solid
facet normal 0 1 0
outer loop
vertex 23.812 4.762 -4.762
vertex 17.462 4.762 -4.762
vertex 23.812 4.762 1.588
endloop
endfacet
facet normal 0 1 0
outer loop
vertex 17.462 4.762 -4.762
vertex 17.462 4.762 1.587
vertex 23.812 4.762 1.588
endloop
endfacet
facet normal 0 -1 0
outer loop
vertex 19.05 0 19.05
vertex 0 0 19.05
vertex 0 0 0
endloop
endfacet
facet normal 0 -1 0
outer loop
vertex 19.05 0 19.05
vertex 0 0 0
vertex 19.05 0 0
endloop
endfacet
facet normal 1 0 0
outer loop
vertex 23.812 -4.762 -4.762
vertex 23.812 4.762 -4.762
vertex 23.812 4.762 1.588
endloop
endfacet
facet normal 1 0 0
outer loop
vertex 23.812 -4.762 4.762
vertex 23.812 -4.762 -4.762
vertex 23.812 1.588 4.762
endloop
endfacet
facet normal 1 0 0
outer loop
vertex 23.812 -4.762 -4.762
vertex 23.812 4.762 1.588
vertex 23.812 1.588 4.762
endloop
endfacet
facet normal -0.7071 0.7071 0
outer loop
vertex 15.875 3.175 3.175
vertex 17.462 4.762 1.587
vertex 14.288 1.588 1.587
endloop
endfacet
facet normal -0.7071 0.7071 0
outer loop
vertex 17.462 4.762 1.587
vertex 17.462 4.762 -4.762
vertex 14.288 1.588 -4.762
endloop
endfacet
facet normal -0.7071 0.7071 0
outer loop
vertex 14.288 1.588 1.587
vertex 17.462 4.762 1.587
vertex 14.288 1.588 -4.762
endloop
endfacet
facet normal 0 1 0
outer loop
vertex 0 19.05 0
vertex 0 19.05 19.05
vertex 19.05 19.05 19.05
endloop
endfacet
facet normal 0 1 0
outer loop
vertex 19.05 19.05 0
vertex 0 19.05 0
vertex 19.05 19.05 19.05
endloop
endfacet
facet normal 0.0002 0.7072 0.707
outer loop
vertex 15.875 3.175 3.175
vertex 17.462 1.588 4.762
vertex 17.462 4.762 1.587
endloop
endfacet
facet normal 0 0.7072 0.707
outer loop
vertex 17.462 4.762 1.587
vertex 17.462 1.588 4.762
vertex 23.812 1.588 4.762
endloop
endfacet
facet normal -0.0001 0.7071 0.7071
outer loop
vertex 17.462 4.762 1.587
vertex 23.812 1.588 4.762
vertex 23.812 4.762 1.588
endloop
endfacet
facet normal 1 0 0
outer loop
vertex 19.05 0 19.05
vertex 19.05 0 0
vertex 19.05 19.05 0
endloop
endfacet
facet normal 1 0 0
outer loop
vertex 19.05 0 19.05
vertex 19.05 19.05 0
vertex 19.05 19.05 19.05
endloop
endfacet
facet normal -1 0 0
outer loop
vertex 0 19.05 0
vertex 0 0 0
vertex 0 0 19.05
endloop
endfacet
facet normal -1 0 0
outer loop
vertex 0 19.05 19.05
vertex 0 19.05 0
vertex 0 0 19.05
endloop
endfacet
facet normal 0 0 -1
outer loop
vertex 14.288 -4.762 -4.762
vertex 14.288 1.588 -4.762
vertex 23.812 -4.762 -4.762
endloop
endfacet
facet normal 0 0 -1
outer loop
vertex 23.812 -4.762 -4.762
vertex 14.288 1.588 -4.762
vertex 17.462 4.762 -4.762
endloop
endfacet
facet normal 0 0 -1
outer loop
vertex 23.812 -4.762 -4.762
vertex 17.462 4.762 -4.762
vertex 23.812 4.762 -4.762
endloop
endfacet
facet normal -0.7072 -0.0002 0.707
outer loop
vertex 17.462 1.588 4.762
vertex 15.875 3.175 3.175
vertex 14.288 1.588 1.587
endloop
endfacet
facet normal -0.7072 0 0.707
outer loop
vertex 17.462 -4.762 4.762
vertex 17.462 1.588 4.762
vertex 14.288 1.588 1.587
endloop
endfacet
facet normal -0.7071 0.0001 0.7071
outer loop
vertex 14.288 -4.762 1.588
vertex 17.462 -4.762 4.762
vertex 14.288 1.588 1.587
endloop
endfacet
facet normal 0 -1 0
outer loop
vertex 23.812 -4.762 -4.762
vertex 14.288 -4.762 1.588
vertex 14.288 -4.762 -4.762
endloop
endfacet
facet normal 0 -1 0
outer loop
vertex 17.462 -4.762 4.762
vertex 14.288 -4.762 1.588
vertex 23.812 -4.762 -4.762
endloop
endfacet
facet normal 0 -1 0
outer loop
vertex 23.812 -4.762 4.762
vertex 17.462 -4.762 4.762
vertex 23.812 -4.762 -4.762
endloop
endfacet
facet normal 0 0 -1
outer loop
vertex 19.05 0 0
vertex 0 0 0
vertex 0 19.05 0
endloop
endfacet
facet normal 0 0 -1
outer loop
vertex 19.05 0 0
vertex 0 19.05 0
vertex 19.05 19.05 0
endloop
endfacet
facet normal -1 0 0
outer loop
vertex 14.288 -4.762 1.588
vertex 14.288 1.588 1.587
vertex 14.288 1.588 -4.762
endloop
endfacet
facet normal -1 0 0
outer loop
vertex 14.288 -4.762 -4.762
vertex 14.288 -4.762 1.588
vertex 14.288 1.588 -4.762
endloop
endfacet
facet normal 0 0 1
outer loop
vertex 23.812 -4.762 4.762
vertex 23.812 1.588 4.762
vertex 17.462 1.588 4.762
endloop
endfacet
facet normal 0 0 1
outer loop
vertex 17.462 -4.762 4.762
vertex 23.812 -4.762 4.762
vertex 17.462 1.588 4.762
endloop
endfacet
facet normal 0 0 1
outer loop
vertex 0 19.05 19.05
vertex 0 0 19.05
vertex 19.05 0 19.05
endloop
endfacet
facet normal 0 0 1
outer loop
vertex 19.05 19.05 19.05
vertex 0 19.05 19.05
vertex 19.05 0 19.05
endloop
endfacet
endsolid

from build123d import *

# Parameters (mm, degrees)
F0_W     = 19.05
F0_H     = 19.05
F1_DEPTH = 19.05
F4_DEPTH = 9.525
F6_DEPTH = 13.8938
F8_DEPTH = 12.192


# Not quite as in the source:
# - a feature names something its author has since deleted; it is built from what else it names


with BuildPart() as f1:
    # F0 (on Front) → F1 (new body)
    with BuildSketch(Plane.XZ):
        with Locations((9.525, 9.525)):
            Rectangle(F0_W, F0_H)
    extrude(amount=-F1_DEPTH)


with BuildPart() as f4:
    # F3 (on offset) → F4 (new body)
    with BuildSketch(Plane.XZ.offset(-4.7625)):
        Polygon((23.8125, 4.7625), (17.4625, 4.7625), (14.2875, 1.5875), (14.2875, -4.7625), (23.8125, -4.7625), align=None)
    extrude(amount=F4_DEPTH)

    # F5 (on face) → F6 (cut)
    with BuildSketch(Plane.YZ.offset(23.8125)):
        Polygon((4.7625, 4.7625), (1.5875, 4.7625), (4.7625, 1.5875), align=None)
    extrude(amount=-F6_DEPTH, mode=Mode.SUBTRACT)

    # F7 (on face) → F8 (cut)
    with BuildSketch(Plane(origin=(0, 0, -4.7625), x_dir=(1, 0, 0), z_dir=(0, 0, -1))):
        Polygon((14.2875, -1.5875), (14.2875, -4.7625), (17.4625, -4.7625), align=None)
    extrude(amount=-F8_DEPTH, mode=Mode.SUBTRACT)


solid = Compound([f1.part, f4.part])
